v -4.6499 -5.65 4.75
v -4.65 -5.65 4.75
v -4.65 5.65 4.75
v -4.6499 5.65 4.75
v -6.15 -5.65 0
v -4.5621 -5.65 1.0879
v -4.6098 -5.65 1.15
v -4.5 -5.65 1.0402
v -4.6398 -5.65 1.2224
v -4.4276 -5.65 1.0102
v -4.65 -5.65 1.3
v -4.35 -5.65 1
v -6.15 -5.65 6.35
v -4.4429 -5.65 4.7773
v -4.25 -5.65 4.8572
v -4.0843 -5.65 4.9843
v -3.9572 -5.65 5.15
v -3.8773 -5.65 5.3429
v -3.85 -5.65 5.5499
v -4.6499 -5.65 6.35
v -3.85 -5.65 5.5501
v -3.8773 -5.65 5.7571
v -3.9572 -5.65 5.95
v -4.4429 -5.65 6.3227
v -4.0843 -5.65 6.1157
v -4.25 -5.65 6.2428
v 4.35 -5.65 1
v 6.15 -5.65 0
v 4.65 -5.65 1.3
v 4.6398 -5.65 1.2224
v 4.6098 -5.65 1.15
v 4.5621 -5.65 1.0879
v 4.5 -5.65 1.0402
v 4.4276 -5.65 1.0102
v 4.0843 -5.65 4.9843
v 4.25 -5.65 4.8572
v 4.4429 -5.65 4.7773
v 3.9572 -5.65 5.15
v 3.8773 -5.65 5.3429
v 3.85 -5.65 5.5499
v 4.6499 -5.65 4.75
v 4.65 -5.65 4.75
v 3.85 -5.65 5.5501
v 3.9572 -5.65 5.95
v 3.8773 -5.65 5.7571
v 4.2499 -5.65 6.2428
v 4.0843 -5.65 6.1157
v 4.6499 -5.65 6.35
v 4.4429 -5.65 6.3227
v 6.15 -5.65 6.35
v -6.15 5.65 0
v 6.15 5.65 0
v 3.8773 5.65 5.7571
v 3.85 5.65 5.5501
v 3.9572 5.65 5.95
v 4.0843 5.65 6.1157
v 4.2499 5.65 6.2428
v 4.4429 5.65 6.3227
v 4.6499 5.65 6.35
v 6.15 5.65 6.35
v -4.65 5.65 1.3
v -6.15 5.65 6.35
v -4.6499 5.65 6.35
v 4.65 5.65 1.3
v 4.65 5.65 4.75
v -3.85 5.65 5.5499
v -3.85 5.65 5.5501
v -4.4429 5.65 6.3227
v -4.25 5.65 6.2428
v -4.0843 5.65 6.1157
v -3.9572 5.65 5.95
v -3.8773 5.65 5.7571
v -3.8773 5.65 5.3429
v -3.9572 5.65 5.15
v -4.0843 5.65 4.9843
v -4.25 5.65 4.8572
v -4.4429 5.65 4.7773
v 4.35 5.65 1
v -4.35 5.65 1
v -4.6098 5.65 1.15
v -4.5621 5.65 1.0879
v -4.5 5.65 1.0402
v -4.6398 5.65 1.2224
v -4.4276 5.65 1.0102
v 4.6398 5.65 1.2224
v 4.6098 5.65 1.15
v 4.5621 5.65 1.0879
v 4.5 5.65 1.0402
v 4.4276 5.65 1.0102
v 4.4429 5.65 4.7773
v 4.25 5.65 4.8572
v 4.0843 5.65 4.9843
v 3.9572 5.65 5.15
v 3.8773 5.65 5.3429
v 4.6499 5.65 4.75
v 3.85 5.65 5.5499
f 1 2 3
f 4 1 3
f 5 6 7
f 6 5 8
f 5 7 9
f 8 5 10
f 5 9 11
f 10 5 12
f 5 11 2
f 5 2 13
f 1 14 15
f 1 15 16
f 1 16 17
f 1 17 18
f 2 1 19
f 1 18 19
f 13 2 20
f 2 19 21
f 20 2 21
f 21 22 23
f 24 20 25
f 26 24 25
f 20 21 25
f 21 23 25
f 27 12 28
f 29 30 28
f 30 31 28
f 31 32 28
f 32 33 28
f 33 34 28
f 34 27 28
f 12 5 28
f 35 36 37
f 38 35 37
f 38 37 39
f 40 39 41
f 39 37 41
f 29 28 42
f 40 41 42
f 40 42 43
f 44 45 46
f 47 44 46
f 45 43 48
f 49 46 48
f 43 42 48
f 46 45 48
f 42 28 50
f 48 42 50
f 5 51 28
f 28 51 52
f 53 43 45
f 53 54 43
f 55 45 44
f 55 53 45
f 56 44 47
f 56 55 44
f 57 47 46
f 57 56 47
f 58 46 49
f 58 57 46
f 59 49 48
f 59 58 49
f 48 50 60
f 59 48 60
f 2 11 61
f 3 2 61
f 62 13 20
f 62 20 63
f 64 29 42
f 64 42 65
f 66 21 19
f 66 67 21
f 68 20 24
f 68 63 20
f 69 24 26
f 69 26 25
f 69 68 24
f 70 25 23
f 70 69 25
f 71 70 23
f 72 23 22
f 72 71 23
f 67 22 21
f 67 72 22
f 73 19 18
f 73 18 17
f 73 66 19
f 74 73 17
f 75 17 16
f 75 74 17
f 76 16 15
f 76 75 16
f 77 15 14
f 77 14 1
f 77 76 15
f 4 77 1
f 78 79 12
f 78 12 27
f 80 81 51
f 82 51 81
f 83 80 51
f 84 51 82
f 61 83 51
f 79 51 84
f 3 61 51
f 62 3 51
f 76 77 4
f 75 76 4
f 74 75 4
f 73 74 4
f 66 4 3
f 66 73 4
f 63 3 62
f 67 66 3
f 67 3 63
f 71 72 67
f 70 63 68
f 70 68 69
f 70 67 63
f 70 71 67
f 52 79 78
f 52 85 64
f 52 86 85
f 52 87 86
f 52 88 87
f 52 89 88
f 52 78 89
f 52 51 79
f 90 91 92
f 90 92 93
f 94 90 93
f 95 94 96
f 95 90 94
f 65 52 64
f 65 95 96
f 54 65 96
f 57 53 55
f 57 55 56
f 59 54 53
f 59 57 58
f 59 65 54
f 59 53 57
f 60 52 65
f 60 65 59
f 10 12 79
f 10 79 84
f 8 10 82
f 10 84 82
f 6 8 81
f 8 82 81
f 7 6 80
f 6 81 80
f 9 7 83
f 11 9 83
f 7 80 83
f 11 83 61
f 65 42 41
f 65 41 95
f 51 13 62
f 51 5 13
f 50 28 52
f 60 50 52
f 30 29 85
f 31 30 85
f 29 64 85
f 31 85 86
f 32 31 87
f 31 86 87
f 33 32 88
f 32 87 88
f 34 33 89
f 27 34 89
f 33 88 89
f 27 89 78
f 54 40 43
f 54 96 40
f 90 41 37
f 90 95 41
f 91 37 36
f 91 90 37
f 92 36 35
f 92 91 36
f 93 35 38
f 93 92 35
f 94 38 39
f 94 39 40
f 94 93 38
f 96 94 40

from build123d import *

# Parameters (mm, degrees)
SKETCH_1_W          = 12.3
SKETCH_1_H          = 11.3
EXTRUDE_1_DEPTH     = 2
SKETCH_2_W          = 1.5
SKETCH_2_H          = 11.3
EXTRUDE_2_DEPTH     = 4.35
SKETCH_5_W          = 9.3
SKETCH_5_H          = 11.5
CUT_EXTRUDE_1_DEPTH = 1
SKETCH_8_W          = 1.6
SKETCH_8_H          = 11.3
EXTRUDE_5_DEPTH     = 0.8
SKETCH_9_W          = 1.6
SKETCH_9_H          = 11.3
EXTRUDE_6_DEPTH     = 0.8
FILLET_7_R          = 0.8
FILLET_8_R          = 0.3


with BuildPart() as part:
    # 스케치1 → 보스-돌출1 (new body)
    with BuildSketch(Plane.XY):
        Rectangle(SKETCH_1_W, SKETCH_1_H)
    extrude(amount=EXTRUDE_1_DEPTH)

    # 스케치2 → 보스-돌출2 (add)
    with BuildSketch(Plane.XY.offset(2)):
        with Locations((-5.4, 0)):
            Rectangle(SKETCH_2_W, SKETCH_2_H)
        with Locations((5.4, 0)):
            Rectangle(SKETCH_2_W, SKETCH_2_H)
    extrude(amount=EXTRUDE_2_DEPTH)

    # 스케치5 → 컷-돌출1 (cut)
    with BuildSketch(Plane.XY.offset(2)):
        Rectangle(SKETCH_5_W, SKETCH_5_H)
    extrude(amount=-CUT_EXTRUDE_1_DEPTH, mode=Mode.SUBTRACT)

    # 스케치8 → 보스-돌출5 (add)
    with BuildSketch(Plane(origin=(-4.65, 0, 0), x_dir=(0, 0, -1), z_dir=(1, 0, 0))):
        with Locations((-5.55, 0)):
            Rectangle(SKETCH_8_W, SKETCH_8_H)
    extrude(amount=EXTRUDE_5_DEPTH)

    # 스케치9 → 보스-돌출6 (add)
    with BuildSketch(Plane.ZY.offset(-4.65)):
        with Locations((5.55, 0)):
            Rectangle(SKETCH_9_W, SKETCH_9_H)
    extrude(amount=EXTRUDE_6_DEPTH)

    # 필렛7
    fillet_7_edges = [part.edges().sort_by_distance(p)[0] for p in [
        (3.85, 0, 6.35),
        (-3.85, 0, 6.35),
        (3.85, 0, 4.75),
        (-3.85, 0, 4.75),
    ]]
    fillet(fillet_7_edges, radius=FILLET_7_R - 0.0001)  # a hair under: the kernel refuses the full size

    # 필렛8
    fillet_8_edges = [part.edges().sort_by_distance(p)[0] for p in [
        (4.65, 0, 1),
        (-4.65, 0, 1),
    ]]
    fillet(fillet_8_edges, radius=FILLET_8_R)


solid = part.part
